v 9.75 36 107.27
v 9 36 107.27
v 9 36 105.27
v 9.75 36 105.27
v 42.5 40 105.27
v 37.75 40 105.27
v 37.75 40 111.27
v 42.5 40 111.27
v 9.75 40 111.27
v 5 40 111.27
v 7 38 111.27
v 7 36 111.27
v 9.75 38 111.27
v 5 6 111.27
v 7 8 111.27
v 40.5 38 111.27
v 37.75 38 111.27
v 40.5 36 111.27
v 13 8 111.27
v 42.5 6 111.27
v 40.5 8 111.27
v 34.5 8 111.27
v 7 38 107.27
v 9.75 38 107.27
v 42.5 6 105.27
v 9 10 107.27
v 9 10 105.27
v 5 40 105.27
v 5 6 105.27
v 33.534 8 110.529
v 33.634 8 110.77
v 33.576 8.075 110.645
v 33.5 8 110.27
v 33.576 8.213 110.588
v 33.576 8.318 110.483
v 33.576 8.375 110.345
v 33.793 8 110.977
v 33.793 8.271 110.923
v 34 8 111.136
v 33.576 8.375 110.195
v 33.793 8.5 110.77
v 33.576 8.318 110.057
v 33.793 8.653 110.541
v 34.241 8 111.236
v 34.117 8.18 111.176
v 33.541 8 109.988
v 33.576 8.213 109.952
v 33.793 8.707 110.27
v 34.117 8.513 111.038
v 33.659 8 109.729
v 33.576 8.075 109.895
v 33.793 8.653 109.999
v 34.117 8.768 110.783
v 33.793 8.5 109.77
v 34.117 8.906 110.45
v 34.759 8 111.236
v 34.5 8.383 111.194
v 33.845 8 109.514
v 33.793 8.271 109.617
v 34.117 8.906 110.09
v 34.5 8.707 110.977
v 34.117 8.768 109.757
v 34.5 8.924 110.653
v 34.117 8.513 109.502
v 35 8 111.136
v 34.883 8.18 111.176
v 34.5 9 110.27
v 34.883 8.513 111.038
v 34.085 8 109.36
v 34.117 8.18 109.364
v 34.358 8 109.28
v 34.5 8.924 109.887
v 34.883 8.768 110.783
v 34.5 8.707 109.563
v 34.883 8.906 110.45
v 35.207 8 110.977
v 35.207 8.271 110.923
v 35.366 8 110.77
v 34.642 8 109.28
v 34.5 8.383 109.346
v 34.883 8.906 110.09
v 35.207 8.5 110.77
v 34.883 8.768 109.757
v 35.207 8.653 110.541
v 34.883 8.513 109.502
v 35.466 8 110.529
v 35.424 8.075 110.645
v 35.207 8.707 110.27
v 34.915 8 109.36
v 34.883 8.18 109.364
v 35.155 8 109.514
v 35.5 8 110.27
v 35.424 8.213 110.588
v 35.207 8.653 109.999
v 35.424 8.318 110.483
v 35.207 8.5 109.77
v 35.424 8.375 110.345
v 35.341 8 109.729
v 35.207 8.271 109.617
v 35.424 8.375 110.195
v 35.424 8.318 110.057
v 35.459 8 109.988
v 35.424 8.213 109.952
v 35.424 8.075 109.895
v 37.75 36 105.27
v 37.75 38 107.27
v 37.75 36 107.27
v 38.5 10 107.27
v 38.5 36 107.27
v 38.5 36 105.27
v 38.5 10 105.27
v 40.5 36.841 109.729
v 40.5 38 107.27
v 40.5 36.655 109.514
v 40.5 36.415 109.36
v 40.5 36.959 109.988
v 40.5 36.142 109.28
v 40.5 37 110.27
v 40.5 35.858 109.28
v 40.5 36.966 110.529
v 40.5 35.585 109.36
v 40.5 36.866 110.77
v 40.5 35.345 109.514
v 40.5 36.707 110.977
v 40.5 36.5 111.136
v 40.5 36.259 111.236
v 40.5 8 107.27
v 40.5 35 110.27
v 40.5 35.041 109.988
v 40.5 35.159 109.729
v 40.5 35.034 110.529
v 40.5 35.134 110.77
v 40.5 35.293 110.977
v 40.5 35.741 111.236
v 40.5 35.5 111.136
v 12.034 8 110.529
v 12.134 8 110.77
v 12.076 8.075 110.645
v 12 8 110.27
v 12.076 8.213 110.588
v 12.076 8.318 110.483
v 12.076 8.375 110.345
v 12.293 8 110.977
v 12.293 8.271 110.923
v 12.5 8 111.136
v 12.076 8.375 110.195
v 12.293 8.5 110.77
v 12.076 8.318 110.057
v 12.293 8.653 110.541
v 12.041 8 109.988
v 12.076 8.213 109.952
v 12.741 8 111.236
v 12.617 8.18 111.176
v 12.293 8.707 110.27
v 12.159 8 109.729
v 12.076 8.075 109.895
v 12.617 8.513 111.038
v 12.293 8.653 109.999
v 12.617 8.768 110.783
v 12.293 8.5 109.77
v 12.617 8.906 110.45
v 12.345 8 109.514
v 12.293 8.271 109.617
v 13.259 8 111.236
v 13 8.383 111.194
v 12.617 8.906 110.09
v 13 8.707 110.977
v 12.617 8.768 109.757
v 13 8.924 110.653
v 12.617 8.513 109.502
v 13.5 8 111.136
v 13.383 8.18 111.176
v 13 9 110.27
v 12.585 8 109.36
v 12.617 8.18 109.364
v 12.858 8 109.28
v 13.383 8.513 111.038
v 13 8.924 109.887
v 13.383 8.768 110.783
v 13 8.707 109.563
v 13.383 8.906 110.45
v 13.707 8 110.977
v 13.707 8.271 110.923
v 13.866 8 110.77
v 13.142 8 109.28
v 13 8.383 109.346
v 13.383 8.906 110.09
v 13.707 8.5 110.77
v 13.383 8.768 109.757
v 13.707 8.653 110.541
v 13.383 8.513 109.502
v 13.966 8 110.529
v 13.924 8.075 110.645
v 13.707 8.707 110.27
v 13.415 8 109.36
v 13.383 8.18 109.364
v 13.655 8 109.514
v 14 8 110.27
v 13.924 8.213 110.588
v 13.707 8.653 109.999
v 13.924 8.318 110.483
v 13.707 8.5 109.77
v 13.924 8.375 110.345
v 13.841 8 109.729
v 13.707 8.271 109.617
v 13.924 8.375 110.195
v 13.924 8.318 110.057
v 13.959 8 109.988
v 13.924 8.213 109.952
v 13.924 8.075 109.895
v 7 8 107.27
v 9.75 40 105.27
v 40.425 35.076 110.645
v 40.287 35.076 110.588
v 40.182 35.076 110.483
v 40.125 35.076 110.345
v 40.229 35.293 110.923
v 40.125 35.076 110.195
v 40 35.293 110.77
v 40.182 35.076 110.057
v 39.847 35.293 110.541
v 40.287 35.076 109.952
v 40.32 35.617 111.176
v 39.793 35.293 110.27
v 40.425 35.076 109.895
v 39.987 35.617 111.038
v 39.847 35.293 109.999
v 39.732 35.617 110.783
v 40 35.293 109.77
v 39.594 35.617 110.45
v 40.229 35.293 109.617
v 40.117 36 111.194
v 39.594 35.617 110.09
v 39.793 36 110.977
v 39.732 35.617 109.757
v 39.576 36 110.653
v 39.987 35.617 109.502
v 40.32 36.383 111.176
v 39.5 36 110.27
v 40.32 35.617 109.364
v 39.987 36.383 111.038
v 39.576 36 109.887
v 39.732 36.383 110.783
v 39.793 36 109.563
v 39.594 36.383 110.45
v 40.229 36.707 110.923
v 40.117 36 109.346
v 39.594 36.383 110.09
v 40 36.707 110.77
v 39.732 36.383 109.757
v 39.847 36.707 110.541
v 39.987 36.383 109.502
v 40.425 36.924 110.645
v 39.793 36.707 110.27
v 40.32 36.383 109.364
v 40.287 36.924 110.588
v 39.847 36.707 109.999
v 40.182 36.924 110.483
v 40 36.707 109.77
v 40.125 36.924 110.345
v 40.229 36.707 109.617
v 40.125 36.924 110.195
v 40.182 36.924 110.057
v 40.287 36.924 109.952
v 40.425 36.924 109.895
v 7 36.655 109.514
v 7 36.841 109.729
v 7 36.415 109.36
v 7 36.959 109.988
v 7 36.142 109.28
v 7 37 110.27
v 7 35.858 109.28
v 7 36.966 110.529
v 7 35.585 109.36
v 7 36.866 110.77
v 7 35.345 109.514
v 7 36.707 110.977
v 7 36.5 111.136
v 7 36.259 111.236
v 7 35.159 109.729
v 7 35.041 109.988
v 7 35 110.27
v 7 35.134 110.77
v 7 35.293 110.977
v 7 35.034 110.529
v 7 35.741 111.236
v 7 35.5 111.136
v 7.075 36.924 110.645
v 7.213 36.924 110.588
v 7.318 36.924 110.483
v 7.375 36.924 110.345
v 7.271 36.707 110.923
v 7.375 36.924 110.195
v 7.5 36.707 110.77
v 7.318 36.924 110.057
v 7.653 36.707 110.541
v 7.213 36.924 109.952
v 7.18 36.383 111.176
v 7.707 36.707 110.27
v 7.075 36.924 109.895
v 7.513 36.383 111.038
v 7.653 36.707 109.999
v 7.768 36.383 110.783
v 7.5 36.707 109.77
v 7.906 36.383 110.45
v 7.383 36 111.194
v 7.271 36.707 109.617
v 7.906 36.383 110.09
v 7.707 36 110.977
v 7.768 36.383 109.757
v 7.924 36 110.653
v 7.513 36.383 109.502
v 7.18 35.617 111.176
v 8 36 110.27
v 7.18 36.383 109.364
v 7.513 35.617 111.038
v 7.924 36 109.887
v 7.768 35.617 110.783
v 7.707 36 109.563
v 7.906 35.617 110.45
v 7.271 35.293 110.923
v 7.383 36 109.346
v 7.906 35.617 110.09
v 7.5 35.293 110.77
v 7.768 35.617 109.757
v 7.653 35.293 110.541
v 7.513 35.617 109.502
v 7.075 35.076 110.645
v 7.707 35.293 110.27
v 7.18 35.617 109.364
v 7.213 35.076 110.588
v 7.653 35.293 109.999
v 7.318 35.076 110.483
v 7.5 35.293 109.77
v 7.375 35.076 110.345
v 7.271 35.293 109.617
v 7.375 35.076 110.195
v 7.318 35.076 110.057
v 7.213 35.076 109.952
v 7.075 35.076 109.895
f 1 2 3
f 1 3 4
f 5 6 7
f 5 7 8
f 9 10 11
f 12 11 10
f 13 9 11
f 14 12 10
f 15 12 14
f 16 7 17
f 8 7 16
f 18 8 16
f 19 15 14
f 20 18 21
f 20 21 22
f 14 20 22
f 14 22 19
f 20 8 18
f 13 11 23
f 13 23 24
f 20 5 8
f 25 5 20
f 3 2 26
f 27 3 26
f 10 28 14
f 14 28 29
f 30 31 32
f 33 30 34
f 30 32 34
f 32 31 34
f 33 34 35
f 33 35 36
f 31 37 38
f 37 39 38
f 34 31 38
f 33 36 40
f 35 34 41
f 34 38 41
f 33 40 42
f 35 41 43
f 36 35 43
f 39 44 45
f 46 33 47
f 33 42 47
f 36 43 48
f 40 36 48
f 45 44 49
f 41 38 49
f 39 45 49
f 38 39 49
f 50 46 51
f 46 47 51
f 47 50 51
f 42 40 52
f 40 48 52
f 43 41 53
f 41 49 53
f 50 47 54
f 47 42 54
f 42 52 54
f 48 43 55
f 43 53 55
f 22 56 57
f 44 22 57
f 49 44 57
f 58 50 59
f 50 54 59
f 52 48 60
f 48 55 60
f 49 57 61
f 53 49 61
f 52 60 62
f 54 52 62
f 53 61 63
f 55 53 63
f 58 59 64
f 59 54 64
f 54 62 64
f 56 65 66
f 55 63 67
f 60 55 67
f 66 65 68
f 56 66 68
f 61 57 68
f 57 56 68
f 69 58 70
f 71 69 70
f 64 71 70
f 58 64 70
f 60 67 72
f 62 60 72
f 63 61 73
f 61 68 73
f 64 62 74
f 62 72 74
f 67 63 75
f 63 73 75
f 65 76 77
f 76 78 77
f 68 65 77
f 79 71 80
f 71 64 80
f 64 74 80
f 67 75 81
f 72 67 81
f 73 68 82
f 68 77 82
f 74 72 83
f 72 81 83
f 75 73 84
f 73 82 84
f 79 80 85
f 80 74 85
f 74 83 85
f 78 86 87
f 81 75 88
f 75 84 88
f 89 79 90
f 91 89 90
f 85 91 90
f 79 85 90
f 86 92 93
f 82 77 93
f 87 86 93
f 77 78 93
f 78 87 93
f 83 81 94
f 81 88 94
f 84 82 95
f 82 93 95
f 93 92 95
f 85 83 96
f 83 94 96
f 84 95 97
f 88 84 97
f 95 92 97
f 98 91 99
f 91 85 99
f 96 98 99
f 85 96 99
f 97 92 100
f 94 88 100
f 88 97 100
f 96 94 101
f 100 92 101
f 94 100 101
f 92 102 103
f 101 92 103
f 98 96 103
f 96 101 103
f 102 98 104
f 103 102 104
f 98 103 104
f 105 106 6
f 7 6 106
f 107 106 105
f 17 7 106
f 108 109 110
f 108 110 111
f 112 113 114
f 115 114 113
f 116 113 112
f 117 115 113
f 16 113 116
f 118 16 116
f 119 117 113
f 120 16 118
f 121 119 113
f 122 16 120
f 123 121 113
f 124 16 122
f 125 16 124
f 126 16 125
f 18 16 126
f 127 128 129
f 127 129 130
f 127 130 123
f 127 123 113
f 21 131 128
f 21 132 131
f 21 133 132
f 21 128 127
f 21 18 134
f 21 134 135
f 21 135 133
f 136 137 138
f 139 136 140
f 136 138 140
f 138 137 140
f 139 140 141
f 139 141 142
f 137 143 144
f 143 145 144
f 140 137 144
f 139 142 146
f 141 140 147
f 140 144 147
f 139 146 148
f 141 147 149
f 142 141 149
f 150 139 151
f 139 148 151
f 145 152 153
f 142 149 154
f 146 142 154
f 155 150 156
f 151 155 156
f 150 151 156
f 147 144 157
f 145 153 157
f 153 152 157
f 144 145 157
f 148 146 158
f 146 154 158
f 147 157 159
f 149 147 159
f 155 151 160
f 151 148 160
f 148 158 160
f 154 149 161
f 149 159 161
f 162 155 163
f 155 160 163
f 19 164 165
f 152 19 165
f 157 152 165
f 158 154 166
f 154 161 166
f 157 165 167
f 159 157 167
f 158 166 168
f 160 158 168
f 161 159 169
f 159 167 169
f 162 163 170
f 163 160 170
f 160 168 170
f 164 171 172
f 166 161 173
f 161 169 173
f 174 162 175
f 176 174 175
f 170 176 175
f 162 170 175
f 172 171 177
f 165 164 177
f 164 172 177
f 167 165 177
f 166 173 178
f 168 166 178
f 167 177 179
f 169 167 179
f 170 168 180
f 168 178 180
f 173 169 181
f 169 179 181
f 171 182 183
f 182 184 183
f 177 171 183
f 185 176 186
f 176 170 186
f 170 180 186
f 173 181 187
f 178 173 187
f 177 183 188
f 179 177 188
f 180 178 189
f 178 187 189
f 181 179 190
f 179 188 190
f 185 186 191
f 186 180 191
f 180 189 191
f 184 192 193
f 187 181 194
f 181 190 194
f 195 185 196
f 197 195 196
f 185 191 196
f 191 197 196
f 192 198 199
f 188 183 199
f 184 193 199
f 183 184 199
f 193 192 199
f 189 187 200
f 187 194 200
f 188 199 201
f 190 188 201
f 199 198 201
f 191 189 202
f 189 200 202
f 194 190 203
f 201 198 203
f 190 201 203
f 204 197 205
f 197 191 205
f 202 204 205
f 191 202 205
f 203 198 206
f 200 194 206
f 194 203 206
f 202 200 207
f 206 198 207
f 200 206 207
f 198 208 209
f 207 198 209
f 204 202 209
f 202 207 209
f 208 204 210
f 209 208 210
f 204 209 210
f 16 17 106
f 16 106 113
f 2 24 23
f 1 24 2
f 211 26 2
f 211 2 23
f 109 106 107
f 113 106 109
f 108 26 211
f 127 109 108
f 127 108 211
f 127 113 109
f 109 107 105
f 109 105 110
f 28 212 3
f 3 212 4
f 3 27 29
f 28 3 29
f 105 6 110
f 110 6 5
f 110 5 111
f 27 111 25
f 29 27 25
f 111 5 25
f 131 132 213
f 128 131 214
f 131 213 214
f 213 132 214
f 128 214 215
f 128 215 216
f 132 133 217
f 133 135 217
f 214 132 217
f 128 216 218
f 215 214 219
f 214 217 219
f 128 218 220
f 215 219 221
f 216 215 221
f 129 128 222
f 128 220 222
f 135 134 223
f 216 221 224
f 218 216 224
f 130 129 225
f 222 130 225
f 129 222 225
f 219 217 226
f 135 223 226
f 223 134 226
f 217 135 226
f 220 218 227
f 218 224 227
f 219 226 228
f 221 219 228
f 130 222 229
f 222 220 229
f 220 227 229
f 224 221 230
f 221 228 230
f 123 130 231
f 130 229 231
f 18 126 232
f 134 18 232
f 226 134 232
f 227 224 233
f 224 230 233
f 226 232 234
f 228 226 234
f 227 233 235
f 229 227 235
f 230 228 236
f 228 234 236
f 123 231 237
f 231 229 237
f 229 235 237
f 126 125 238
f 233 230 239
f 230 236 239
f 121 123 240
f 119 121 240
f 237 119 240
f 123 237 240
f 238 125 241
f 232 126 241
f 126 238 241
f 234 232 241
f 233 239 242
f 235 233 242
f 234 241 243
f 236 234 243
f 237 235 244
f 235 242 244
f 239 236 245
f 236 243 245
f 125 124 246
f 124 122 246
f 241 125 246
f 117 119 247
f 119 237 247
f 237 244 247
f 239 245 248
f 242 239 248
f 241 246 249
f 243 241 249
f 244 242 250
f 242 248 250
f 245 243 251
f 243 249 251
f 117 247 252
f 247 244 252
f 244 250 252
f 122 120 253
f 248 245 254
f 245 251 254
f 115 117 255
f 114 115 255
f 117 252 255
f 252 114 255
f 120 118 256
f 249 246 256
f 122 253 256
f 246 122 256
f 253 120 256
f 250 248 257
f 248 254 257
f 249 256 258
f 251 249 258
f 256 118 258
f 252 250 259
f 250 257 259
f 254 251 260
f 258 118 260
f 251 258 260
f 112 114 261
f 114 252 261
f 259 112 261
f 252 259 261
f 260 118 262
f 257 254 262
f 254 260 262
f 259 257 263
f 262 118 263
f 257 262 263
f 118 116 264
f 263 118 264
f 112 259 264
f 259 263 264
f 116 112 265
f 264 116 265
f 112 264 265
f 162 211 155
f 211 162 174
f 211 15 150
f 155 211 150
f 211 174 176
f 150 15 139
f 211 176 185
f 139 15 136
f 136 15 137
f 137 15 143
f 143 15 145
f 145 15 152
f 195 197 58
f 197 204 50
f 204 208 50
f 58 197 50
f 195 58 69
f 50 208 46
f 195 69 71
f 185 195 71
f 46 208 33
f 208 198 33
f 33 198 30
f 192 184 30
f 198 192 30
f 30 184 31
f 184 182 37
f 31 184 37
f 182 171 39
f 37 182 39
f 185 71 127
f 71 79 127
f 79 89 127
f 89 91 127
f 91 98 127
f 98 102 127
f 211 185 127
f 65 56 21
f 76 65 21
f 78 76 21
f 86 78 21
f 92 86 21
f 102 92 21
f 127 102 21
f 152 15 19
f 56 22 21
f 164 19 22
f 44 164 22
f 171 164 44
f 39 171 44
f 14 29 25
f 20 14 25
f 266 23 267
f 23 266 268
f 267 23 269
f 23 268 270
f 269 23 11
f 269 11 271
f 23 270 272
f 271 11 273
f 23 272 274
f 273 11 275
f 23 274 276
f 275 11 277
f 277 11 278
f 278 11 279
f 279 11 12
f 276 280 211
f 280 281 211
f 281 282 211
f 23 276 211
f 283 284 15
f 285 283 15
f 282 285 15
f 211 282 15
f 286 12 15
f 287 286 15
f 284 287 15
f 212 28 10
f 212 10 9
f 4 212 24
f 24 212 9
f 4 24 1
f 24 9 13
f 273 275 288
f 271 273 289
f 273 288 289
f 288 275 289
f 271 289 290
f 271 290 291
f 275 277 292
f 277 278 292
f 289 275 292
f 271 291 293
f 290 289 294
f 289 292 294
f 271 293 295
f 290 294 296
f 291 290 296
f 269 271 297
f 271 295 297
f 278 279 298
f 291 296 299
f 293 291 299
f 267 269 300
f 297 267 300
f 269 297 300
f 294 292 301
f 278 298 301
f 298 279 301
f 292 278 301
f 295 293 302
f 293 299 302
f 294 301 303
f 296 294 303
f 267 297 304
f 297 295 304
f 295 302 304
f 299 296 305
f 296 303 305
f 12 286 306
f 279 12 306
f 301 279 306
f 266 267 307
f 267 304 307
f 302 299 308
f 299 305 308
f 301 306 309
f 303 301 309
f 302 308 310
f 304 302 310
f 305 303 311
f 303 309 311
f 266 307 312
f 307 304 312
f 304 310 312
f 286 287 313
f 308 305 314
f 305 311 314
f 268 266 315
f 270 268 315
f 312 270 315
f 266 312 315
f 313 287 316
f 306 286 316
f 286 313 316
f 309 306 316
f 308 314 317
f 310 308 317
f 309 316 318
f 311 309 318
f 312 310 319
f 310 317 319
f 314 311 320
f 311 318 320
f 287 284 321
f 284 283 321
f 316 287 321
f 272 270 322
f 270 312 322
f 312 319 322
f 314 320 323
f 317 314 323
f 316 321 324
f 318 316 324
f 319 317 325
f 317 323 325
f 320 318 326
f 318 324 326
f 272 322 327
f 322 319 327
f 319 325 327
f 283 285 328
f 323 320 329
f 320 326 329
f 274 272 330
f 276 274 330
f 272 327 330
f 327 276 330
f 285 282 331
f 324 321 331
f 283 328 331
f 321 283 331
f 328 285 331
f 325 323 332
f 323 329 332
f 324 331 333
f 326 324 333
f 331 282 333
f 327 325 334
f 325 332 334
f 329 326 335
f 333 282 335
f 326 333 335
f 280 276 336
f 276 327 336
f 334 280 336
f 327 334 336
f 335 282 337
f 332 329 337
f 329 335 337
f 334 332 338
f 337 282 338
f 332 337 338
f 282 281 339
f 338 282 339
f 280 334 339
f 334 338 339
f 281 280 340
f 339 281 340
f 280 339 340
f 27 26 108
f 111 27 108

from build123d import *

# Parameters (mm, degrees)
SKETCH049_W             = 34
SKETCH049_H             = 37.5
PAD032_DEPTH            = 6
SKETCH050_W             = 30
SKETCH050_H             = 33.5
POCKET014_DEPTH         = 4
SKETCH051_W             = 26
SKETCH051_H             = 29.5
POCKET015_DEPTH         = 2.001
SKETCH052_W             = 4
SKETCH052_H             = 28
POCKET016_DEPTH         = 6.001
REVOLUTION_ANGLE        = 180
REVOLUTION001_ANGLE     = -180
REVOLUTION002_ANGLE     = 180
BODY009_PLACEMENT_ANGLE = -90


with BuildPart() as part:
    # Sketch049 → Pad032 (new body)
    with BuildSketch(Plane.XY):
        with Locations((17, 18.75)):
            Rectangle(SKETCH049_W, SKETCH049_H)
    extrude(amount=PAD032_DEPTH)

    # Sketch050 (on Face6 of Pad032) → Pocket014 (cut)
    with BuildSketch(Plane.XY.offset(6)):
        with Locations((17, 18.75)):
            Rectangle(SKETCH050_W, SKETCH050_H)
    extrude(amount=-POCKET014_DEPTH, mode=Mode.SUBTRACT)

    # Sketch051 (on Face11 of Pocket014) → Pocket015 (cut, through all)
    with BuildSketch(Plane.XY.offset(2)):
        with Locations((17, 18.75)):
            Rectangle(SKETCH051_W, SKETCH051_H)
    extrude(amount=-POCKET015_DEPTH, mode=Mode.SUBTRACT)

    # Sketch052 (on Face5 of Pocket015) → Pocket016 (cut, through all)
    with BuildSketch(Plane.XY.offset(6)):
        with Locations((2, 18.75)):
            Rectangle(SKETCH052_W, SKETCH052_H)
    extrude(amount=-POCKET016_DEPTH, mode=Mode.SUBTRACT)

    # Sketch053 (on Face17 of Pocket016) → Revolution (revolve)
    with BuildSketch(Plane(origin=(32, 0, 0), x_dir=(0, -1, 0), z_dir=(-1, 0, 0))):
        with BuildLine():
            ThreePointArc((-28.5, 5), (-29.5, 6), (-30.5, 5))
            Line((-28.5, 5), (-30.5, 5))
        make_face()
        with BuildLine():
            ThreePointArc((-7, 5), (-8, 6), (-9, 5))
            Line((-9, 5), (-7, 5))
        make_face()
    revolve(axis=Axis((32, 29.201832, 5), (0, -1, 0)), revolution_arc=REVOLUTION_ANGLE)

    # Sketch054 (on Face16 of Revolution) → Revolution001 (revolve)
    with BuildSketch(Plane(origin=(0, 2, 0), x_dir=(-1, 0, 0), z_dir=(0, 1, 0))):
        with BuildLine():
            ThreePointArc((-3, 5), (-4, 6), (-5, 5))
            Line((-5, 5), (-3, 5))
        make_face()
    revolve(axis=Axis((5, 2, 5), (1, 0, 0)), revolution_arc=REVOLUTION001_ANGLE)

    # Sketch055 (on Face19 of Revolution001) → Revolution002 (revolve)
    with BuildSketch(Plane.XZ.offset(-35.5)):
        with BuildLine():
            ThreePointArc((5, 5), (4, 6), (3, 5))
            Line((3, 5), (5, 5))
        make_face()
    revolve(axis=Axis((5, 35.5, 5), (1, 0, 0)), revolution_arc=REVOLUTION002_ANGLE)


with BuildPart() as part_1:
    # Body009 placement: moved
    add(part.part.moved(Location((5, 40, 105.27))).rotate(Axis((5, 40, 105.27), (0, 0, 1)), BODY009_PLACEMENT_ANGLE))


solid = part_1.part
